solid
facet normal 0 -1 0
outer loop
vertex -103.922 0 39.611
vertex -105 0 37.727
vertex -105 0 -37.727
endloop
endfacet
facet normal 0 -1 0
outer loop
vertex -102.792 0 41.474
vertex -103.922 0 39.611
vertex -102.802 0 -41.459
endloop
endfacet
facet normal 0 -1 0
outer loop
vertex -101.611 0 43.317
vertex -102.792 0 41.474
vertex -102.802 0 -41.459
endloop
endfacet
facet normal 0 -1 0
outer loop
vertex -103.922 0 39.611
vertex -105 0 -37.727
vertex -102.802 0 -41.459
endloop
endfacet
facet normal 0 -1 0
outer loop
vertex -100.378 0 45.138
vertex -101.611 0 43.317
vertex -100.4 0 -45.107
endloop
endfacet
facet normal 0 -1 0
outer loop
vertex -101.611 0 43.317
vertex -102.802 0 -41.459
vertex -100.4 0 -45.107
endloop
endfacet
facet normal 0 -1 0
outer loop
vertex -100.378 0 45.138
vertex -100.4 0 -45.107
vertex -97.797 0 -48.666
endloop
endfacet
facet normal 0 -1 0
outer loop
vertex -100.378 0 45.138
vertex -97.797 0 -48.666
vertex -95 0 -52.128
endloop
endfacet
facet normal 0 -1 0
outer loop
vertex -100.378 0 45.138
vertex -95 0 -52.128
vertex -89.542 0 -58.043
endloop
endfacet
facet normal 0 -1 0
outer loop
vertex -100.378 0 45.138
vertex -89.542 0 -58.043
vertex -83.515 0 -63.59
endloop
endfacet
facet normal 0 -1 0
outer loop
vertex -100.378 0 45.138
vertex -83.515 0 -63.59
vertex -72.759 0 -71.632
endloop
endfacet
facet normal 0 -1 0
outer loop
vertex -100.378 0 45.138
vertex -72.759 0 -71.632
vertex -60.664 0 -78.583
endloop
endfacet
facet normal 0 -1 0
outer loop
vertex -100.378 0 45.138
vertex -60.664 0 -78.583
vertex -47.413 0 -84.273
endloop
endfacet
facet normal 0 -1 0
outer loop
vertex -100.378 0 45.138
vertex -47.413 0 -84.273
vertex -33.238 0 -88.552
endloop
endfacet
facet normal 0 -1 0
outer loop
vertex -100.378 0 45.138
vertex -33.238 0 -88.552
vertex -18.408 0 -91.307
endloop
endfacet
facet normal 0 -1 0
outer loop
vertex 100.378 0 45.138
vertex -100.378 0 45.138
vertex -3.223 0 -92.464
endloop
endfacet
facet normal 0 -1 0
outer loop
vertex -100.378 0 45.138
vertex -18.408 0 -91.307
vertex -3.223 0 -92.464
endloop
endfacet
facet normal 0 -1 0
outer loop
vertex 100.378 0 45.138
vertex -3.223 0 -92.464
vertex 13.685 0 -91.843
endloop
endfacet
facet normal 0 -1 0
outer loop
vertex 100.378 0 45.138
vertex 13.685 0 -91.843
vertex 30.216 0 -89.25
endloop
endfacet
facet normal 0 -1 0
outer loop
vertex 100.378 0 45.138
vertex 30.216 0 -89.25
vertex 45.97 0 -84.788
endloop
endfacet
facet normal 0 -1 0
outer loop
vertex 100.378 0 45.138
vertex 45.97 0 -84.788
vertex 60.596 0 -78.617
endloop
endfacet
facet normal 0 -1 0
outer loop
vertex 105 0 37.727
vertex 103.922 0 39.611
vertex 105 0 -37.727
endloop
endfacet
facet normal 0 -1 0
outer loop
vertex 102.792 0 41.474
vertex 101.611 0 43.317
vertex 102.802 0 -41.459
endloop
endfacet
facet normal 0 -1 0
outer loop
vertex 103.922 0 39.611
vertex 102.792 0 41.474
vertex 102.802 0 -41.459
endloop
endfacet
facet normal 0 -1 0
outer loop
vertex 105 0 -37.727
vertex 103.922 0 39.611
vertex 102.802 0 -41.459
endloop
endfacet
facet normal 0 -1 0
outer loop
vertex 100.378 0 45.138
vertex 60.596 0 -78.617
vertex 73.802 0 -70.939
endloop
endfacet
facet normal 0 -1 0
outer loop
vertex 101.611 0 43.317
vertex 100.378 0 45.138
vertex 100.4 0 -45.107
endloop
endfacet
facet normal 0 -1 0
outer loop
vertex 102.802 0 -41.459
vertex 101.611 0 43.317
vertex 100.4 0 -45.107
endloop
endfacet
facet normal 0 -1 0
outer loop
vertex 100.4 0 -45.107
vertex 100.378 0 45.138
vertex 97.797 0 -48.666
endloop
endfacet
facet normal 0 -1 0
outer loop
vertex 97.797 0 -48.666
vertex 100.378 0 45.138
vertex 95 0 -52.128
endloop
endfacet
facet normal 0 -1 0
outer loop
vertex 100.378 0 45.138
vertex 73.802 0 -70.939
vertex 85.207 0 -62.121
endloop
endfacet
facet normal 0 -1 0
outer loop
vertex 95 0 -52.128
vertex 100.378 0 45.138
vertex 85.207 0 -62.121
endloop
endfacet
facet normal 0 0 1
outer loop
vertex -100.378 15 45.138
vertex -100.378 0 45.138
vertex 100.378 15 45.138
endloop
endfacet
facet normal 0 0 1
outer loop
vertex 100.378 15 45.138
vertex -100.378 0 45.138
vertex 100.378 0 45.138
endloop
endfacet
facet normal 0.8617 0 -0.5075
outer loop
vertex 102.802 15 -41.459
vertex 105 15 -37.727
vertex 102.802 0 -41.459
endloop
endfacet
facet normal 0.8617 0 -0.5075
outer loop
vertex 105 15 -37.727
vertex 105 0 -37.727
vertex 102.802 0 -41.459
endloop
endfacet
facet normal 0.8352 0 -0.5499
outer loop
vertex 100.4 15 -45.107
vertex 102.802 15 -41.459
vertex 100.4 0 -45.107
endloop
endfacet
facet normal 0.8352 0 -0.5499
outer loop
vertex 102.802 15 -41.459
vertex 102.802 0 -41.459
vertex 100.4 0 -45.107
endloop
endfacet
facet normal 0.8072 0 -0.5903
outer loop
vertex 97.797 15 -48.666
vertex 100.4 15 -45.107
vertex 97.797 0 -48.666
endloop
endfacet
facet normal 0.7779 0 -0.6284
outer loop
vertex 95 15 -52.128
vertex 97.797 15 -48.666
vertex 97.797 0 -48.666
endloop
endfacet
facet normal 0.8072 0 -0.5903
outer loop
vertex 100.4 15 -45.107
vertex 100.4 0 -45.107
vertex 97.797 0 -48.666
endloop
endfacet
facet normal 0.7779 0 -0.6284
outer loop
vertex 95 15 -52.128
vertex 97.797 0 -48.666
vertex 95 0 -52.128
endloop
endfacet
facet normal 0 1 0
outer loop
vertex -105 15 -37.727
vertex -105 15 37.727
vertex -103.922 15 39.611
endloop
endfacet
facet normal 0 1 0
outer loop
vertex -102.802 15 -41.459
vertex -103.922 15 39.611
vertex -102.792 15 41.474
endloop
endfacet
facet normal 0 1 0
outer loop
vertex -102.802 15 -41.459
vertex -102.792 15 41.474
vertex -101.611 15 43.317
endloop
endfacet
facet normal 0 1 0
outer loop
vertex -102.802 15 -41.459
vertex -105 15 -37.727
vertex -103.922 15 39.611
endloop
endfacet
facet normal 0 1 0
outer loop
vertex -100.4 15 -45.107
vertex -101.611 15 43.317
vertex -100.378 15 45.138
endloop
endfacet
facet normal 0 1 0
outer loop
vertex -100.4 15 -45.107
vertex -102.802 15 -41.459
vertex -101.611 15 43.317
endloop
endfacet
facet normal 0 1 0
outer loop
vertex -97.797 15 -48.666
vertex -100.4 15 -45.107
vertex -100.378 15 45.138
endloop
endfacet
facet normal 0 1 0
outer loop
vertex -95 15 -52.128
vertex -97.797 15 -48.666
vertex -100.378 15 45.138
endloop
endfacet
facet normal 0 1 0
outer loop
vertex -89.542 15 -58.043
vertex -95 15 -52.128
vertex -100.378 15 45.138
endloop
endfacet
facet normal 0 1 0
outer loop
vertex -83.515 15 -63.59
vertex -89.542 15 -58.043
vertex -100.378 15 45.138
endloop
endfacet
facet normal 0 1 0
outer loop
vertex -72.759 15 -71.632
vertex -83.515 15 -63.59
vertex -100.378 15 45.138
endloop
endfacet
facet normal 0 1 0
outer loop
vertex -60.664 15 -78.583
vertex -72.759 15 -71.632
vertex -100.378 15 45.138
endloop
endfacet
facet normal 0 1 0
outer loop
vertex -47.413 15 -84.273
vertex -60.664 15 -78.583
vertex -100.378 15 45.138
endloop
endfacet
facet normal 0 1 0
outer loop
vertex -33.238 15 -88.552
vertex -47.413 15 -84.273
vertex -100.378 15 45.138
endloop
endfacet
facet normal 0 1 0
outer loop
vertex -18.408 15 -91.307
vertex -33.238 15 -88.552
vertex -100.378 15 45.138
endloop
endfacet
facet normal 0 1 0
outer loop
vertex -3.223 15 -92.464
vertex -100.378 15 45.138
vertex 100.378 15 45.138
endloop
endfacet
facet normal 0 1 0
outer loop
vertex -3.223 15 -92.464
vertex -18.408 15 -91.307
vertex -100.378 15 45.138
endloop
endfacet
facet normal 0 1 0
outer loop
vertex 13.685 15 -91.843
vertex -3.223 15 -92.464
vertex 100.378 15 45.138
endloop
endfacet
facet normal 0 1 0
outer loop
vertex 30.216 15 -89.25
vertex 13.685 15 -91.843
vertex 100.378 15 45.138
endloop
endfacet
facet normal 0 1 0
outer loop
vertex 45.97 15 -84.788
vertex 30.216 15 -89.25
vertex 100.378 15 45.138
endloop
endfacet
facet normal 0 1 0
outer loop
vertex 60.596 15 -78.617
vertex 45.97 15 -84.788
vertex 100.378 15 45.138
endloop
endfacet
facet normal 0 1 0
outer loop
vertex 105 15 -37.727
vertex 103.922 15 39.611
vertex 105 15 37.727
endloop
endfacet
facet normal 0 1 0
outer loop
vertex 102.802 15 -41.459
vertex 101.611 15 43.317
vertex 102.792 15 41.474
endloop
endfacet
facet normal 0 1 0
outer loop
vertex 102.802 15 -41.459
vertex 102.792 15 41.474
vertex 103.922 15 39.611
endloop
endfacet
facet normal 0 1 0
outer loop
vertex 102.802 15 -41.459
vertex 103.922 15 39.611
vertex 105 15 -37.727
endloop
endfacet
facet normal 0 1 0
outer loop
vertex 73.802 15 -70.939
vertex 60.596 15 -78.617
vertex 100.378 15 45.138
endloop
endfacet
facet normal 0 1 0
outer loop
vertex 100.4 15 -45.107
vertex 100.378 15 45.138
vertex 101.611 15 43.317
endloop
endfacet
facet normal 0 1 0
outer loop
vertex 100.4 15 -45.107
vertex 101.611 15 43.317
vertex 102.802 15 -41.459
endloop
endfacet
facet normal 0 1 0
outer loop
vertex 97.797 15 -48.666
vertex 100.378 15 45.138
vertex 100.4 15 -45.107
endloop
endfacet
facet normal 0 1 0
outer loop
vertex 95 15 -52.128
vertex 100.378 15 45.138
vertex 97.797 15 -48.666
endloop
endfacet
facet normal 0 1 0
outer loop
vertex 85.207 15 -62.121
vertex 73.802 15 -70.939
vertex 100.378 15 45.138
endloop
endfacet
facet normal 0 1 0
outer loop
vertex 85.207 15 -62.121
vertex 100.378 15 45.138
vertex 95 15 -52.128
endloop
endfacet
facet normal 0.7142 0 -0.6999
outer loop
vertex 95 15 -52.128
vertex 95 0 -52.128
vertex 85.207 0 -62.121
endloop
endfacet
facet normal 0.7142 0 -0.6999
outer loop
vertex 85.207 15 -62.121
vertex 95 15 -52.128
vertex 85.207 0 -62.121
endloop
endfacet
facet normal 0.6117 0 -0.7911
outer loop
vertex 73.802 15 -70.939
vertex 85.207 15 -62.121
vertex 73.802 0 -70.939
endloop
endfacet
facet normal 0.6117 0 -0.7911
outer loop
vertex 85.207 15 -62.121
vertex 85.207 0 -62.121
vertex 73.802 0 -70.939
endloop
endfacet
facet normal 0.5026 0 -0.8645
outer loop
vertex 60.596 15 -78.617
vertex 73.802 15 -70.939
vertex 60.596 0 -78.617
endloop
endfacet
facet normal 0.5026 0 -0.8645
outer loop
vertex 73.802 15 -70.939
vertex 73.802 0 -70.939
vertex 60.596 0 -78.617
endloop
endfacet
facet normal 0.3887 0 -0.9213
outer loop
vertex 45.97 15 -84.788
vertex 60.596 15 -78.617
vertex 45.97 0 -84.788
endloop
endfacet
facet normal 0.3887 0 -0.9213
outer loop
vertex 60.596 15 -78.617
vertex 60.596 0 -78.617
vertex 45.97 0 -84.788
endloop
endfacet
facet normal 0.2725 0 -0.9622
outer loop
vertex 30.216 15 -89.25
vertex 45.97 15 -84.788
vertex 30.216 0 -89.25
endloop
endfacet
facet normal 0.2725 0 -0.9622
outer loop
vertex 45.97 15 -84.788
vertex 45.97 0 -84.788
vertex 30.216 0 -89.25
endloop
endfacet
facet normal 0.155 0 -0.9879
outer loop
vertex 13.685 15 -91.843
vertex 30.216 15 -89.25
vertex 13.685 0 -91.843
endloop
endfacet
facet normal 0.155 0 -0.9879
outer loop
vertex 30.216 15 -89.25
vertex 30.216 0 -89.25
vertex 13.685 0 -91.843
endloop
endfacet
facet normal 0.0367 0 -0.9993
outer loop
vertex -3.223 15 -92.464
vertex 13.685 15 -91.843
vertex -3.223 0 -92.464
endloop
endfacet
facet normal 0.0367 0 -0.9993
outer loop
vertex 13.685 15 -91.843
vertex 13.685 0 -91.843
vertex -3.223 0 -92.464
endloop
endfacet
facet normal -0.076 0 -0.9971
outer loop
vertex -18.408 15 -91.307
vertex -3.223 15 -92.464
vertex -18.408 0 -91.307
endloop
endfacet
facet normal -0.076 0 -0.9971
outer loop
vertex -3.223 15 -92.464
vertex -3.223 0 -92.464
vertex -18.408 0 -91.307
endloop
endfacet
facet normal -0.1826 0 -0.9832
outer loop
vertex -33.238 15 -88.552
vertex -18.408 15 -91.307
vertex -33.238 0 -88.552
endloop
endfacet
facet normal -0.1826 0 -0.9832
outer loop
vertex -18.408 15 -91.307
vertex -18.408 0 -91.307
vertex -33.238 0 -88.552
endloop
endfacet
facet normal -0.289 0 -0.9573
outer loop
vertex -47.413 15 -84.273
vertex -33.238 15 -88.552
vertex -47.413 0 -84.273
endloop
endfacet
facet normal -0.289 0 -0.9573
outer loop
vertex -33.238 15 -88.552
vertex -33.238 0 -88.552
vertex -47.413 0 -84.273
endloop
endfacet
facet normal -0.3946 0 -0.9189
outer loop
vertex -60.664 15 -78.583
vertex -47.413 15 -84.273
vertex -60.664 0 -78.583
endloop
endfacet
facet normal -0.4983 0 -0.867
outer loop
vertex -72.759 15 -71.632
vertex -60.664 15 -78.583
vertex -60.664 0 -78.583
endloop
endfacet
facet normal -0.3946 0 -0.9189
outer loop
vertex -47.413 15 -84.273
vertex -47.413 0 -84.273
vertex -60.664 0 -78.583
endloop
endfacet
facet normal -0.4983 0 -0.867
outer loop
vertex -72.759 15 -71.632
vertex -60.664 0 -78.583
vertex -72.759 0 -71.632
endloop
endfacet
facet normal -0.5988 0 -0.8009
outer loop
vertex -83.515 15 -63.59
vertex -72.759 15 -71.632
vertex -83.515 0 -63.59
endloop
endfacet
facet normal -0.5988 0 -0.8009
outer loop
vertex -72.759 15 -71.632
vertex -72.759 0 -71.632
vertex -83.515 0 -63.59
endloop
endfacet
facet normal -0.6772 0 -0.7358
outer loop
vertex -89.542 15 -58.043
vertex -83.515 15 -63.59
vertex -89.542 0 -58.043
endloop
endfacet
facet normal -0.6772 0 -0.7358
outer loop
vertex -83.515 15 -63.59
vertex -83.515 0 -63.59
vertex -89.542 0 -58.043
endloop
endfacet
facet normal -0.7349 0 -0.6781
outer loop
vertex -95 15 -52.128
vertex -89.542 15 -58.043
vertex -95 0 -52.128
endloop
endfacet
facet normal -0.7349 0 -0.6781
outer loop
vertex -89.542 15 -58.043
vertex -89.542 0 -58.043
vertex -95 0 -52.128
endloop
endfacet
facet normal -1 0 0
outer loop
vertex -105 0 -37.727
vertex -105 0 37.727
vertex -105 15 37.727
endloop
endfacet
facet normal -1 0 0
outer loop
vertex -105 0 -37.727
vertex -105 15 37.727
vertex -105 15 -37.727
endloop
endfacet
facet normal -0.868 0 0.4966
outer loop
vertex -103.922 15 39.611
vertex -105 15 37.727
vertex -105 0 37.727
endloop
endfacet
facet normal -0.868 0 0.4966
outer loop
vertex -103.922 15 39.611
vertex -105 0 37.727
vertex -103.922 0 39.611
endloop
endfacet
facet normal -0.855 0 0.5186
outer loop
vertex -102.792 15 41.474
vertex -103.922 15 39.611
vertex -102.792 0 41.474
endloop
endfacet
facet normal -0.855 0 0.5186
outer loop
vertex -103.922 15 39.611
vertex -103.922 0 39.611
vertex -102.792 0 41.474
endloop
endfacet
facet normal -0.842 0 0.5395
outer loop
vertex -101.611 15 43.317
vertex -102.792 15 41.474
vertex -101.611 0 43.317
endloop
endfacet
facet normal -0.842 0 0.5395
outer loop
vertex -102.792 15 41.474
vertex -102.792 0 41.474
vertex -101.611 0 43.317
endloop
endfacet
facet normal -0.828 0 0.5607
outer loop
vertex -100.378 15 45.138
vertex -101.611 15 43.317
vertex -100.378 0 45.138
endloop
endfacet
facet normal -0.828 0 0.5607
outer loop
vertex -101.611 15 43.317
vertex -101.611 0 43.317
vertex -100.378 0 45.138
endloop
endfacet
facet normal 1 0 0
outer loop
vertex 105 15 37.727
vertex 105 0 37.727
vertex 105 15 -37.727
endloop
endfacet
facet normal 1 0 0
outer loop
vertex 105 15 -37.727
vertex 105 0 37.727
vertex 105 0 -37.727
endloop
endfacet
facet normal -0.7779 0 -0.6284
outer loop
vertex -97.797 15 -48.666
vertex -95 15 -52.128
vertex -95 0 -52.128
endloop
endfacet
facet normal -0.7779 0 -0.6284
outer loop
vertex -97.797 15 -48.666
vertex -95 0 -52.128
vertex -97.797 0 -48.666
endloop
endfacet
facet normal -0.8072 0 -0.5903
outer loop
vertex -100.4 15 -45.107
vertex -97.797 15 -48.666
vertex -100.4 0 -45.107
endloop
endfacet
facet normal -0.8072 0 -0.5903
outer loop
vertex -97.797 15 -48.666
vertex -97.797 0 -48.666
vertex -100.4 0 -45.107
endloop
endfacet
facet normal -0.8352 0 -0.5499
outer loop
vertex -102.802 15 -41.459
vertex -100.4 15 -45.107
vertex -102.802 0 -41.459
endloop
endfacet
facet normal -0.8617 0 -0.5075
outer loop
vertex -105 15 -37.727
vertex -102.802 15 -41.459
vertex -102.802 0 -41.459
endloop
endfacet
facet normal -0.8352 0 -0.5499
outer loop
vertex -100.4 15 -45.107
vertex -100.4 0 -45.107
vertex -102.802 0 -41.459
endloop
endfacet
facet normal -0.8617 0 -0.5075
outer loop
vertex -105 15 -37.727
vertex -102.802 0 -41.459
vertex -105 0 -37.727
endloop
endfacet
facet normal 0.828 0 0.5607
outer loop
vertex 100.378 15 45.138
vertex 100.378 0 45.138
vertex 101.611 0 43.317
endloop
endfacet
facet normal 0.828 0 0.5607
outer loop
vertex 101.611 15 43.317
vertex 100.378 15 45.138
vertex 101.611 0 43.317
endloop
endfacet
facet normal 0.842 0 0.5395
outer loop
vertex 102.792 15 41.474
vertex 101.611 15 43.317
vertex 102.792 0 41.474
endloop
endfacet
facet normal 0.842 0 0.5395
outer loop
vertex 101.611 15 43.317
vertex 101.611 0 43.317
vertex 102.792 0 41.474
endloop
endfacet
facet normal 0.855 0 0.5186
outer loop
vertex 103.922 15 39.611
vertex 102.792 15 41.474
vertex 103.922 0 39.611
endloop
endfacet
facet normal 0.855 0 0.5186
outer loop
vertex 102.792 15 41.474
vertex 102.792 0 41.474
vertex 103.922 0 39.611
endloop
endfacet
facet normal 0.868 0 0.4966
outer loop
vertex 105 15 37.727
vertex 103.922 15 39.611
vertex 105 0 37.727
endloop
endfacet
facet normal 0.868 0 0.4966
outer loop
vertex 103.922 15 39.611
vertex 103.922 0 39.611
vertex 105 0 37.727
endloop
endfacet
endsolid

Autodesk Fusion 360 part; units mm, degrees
sketch "Sketch1" plane through (0, 0, 0) normal (0, 1, 0) x (1, 0, 0)
  line L0 (-105, -37.7273) -> (-105, 37.7273)
  line L1 (-95, 52.1277) -> (-95, -52.1277)
  line L2 (0, 0) -> (105, 0) construction
  line L3 (0, -20) -> (0, -2.5) construction
  line L4 (0, 92.5) -> (0, 82.5) construction
  ellipse E0 centre (0, 0) end of major axis (-115, 0) minor radius 92.5
  line L5 (115, 0) -> (-115, 0) construction
  line L6 (0, 92.5) -> (0, -92.5) construction
  ellipse E1 centre (0, 0) end of major axis (-105, 0) minor radius 82.5
  line L7 (105, 0) -> (115, 0) construction
  line L8 (0, -1.75) -> (0, -22.5)
  line L9 (95, 52.1277) -> (95, -52.1277)
  line L10 (105, -37.7273) -> (105, 37.7273)
  line L11 (-95, -35.1382) -> (95, -35.1382)
  line L12 (-100.3783, -45.1382) -> (100.3783, -45.1382)
  dimension "d1" = 10
  dimension "d3" = 10
  dimension "d4" = 10
  dimension "d5" = 82.5
  dimension "d7" = 95
  dimension "d13" = 10
extrude "Extrude1" add sketch "Sketch1" along normal blind 15 contours L0 L1 E0 E1 L12 | L1 E1 | L0 L1 E0 E1 | L1 E1 L12 | E1 L11 L12 | L1 E1 L9 L11 | L1 E0 E1 L9 | E1 L9 L12 | E1 L9 | E0 E1 L9 L10 L12 | E0 E1 L9 L10
equation "d1 = SideWidth"
equation "d3 = SideWidth"
equation "d4 = SideWidth"
equation "d5 = CaseWidth / 2"
equation "SideWidth = 10 mm"
equation "d7 = CaseLength / 2"
equation "CaseLength = 190 mm"
equation "CaseWidth = 165 mm"
equation "PanelHeight = 15 mm"
equation "d11 = PanelHeight"
equation "d13 = SideWidth"
